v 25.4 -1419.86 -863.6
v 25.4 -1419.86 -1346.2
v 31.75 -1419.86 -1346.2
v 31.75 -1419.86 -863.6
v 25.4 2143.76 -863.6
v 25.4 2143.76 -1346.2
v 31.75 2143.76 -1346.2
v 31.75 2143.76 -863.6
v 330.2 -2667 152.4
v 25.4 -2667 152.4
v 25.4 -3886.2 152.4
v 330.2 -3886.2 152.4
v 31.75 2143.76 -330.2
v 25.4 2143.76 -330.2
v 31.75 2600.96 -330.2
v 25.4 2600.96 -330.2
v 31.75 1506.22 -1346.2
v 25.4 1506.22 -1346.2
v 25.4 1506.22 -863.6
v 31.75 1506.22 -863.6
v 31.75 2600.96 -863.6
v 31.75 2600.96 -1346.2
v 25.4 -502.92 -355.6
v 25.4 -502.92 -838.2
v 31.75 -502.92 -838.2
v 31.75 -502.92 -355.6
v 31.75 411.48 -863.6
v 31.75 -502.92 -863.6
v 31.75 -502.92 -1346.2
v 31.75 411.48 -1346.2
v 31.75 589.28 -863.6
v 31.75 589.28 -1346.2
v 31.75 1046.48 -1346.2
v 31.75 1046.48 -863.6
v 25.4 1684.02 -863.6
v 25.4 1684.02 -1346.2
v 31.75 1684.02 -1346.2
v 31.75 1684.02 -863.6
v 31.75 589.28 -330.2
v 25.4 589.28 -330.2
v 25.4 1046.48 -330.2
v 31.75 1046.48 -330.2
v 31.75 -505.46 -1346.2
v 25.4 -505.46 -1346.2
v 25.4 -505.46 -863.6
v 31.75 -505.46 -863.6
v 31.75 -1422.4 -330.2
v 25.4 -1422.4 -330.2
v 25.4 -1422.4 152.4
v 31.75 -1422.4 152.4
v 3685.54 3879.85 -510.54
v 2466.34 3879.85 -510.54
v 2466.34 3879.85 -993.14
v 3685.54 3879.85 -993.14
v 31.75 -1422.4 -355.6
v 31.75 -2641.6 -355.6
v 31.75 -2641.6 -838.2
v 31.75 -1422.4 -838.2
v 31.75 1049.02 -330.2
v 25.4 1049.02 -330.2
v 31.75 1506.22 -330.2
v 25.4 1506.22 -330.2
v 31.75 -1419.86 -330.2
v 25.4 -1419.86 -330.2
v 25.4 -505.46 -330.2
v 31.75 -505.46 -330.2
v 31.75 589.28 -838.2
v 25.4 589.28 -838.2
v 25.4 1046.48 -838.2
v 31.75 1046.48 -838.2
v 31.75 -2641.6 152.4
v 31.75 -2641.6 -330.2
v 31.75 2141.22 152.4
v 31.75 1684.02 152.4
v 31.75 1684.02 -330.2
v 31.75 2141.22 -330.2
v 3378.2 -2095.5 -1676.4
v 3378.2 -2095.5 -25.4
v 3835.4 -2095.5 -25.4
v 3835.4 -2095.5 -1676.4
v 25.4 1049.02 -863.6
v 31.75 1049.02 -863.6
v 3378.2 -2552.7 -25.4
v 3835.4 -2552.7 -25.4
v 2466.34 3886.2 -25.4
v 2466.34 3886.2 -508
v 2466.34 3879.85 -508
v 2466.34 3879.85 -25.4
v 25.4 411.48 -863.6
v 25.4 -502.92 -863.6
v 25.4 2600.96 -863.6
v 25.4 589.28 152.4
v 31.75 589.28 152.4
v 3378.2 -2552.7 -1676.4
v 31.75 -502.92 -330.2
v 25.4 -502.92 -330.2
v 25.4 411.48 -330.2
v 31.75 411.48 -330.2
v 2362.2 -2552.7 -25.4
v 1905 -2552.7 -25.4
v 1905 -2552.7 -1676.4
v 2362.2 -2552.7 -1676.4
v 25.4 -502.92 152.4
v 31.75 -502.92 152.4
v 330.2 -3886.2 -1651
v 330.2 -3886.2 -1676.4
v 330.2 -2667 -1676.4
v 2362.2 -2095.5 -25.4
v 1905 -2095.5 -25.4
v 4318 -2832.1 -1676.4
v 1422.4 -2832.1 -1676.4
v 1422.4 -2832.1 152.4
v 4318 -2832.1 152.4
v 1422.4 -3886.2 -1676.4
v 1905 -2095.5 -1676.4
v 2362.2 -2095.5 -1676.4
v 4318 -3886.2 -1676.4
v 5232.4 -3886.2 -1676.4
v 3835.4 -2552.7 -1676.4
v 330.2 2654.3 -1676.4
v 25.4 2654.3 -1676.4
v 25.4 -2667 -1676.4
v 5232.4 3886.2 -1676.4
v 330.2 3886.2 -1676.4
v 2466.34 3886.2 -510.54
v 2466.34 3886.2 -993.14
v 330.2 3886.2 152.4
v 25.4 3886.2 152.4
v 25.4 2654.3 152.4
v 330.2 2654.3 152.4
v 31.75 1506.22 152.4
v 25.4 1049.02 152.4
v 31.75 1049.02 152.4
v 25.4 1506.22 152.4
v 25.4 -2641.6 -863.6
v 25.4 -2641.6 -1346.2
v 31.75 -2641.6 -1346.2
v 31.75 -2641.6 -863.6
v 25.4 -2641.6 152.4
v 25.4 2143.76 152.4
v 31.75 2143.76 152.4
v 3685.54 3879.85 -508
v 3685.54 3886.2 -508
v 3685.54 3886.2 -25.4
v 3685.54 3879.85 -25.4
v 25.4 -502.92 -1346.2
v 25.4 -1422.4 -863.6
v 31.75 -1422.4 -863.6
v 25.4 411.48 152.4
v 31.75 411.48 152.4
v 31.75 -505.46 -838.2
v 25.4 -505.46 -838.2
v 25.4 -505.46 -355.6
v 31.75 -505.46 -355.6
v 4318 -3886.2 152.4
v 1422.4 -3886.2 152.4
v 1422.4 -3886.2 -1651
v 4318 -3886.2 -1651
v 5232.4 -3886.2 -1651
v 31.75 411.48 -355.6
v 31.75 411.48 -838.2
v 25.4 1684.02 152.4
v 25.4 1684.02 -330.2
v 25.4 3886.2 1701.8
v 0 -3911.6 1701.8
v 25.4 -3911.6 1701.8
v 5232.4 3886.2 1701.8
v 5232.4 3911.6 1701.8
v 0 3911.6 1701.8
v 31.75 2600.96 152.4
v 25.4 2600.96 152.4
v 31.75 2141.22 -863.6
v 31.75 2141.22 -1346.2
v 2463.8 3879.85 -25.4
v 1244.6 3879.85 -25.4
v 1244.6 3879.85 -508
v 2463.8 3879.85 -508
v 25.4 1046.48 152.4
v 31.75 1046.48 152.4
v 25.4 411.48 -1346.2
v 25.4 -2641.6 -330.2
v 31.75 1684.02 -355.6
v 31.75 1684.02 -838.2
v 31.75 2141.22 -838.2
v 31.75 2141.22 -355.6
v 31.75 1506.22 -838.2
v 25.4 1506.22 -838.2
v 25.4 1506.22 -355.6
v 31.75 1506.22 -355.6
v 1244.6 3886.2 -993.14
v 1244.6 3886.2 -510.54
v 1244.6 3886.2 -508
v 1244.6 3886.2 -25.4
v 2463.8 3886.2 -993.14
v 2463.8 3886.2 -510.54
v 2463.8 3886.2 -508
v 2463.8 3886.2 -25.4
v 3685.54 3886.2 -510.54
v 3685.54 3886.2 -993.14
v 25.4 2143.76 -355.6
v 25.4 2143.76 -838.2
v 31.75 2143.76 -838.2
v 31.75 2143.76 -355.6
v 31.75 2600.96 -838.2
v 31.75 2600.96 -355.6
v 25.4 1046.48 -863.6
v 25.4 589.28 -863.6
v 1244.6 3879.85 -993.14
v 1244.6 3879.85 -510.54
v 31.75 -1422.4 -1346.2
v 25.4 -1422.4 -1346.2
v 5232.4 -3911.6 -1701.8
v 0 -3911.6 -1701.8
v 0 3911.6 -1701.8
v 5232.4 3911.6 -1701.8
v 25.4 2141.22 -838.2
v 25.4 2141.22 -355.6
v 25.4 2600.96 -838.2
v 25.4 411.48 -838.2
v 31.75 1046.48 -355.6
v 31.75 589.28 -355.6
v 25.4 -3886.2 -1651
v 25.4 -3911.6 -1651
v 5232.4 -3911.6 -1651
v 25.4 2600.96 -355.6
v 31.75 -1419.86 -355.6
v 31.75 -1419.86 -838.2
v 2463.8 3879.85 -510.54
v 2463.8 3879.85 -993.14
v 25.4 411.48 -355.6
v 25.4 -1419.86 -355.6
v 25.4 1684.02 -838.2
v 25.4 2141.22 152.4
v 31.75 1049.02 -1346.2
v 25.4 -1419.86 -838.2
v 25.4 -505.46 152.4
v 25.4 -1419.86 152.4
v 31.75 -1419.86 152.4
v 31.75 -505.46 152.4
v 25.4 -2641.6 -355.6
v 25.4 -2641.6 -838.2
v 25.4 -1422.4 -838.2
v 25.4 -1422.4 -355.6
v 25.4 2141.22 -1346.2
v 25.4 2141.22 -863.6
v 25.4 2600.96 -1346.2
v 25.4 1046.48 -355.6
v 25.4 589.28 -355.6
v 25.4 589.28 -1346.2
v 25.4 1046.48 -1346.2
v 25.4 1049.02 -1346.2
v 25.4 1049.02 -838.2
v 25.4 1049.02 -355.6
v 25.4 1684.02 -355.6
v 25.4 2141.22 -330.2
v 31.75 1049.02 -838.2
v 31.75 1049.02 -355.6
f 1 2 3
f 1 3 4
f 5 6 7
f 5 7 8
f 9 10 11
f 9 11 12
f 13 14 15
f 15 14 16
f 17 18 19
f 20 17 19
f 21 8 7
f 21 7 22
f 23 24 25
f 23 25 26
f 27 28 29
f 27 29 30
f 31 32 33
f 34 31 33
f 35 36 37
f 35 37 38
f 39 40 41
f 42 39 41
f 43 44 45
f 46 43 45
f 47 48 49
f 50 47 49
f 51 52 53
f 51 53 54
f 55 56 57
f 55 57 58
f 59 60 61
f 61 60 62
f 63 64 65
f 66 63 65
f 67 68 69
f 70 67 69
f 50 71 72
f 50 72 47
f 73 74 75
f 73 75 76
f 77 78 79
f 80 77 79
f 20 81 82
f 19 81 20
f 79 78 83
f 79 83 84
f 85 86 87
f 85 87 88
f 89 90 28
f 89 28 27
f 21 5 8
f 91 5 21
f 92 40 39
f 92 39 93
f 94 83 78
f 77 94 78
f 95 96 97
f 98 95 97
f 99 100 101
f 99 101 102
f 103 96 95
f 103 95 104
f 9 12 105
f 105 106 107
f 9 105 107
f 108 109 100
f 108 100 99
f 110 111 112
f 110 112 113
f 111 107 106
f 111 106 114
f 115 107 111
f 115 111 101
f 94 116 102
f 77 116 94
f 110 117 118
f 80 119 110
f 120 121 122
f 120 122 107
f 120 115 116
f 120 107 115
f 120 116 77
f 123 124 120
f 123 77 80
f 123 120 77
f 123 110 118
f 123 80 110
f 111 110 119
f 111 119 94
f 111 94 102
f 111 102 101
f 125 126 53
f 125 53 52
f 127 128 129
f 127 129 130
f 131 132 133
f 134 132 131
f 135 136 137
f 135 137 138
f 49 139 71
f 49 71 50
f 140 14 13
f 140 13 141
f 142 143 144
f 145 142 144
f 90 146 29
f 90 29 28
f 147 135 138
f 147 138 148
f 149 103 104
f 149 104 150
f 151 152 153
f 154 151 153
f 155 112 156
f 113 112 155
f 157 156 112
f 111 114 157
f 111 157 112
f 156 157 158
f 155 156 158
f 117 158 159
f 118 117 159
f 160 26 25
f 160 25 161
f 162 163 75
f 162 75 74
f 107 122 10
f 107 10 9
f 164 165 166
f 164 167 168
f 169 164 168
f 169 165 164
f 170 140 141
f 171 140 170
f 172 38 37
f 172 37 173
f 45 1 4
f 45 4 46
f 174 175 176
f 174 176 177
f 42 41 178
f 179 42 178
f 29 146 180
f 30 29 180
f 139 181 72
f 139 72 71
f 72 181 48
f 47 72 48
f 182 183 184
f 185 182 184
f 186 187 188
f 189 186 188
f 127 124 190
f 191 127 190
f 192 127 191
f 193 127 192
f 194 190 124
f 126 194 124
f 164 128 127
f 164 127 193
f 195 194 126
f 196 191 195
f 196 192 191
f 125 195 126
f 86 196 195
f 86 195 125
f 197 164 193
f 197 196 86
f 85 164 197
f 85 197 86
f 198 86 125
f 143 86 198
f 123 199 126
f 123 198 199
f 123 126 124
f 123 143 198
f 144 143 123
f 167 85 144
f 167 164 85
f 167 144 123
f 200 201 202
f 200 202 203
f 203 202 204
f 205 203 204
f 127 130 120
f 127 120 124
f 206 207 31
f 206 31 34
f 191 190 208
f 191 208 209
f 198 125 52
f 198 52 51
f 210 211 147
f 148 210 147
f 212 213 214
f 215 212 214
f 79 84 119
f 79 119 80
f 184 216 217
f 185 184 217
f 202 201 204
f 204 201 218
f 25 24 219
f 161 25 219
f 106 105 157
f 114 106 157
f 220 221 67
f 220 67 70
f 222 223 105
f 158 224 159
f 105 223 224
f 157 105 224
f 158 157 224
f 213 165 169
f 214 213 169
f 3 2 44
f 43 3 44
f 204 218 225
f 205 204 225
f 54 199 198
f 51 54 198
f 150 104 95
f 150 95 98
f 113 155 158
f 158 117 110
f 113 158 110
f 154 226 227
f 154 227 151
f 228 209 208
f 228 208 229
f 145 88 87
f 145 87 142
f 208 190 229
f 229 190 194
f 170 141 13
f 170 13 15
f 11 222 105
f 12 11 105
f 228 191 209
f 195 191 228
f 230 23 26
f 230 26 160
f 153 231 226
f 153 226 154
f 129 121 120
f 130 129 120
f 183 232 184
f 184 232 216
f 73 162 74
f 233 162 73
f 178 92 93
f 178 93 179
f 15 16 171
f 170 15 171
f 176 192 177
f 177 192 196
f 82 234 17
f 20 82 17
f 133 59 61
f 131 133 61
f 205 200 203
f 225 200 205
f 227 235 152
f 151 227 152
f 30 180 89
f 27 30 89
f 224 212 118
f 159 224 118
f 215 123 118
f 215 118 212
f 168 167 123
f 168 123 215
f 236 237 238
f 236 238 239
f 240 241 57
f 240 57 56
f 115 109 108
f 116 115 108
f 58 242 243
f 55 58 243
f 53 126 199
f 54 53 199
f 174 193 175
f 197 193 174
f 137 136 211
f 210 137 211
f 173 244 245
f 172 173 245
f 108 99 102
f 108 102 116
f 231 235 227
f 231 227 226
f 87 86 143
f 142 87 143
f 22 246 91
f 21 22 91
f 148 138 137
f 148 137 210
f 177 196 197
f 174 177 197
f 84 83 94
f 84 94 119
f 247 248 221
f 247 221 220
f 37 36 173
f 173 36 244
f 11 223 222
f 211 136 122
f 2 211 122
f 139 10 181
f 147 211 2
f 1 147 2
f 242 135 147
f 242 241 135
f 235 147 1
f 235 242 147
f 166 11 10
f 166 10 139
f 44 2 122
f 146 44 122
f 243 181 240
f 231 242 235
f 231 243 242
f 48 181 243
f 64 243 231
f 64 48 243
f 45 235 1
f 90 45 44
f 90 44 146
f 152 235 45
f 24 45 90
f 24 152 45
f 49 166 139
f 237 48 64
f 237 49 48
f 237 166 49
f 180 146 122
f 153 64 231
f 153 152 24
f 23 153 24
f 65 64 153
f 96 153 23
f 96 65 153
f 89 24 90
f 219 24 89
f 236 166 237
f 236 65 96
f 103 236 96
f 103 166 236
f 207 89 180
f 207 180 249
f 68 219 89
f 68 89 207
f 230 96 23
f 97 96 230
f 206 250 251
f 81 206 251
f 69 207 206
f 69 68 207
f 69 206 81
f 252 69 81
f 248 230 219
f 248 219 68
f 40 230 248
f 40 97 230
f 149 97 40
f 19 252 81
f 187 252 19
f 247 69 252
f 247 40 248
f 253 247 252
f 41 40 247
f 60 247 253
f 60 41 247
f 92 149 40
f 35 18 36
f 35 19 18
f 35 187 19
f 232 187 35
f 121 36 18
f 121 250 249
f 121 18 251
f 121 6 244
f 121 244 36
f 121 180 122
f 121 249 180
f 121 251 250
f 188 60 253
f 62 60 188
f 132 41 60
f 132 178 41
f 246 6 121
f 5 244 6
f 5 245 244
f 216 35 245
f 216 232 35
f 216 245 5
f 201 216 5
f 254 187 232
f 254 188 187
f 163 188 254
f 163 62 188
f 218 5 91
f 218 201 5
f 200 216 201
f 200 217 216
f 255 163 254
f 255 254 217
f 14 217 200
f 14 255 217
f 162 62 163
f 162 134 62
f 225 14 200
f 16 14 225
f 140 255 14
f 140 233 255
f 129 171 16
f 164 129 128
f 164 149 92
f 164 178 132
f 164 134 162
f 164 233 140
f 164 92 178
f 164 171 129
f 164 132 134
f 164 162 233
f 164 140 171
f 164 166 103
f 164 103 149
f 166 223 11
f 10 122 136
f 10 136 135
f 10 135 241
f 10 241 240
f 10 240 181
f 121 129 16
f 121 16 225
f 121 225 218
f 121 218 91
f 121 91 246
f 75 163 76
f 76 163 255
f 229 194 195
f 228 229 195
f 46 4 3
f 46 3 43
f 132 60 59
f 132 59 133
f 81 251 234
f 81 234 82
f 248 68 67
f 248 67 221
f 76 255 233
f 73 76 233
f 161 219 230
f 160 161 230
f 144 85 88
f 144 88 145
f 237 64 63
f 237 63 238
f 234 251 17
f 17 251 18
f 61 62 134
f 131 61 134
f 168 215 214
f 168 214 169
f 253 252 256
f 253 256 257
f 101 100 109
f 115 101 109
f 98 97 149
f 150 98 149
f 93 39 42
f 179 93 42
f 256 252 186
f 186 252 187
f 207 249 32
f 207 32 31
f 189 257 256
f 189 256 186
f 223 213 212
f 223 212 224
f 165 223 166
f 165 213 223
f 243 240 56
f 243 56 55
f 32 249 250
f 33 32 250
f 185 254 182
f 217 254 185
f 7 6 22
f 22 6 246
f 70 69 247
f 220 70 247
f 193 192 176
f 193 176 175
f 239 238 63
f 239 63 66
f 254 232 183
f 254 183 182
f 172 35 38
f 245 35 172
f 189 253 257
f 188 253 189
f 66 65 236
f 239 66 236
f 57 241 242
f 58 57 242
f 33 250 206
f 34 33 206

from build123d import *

# Parameters (mm, degrees)
F0_W      = 7823.2
F0_H      = 3403.6
F1_DEPTH  = 5232.4
F3_DEPTH  = 5207
F4_W      = 5207
F4_H      = 7772.4
F5_DEPTH  = 25.4
F6_W      = 2895.6
F6_H      = 1054.1
F7_DEPTH  = 1828.8
F8_W      = 1219.2
F8_H      = 482.6
F8_W_2    = 914.4
F9_DEPTH  = 6.35
F10_W     = 457.2
F10_H     = 482.6
F11_DEPTH = 6.35
F12_W     = 1219.2
F12_H     = 482.6
F13_DEPTH = 6.35
F14_W     = 304.8
F14_H     = 1231.9
F15_DEPTH = 1828.8
F16_W     = 304.8
F16_H     = 1219.2
F17_DEPTH = 1828.8
F18_W     = 457.2
F18_H     = 457.2
F19_DEPTH = 1651


with BuildPart() as f1:
    # F0 (on Right) → F1 (new body)
    with BuildSketch(Plane.YZ):
        Rectangle(F0_W, F0_H)
    extrude(amount=F1_DEPTH)

    # F2 (on face) → F3 (cut)
    with BuildSketch(Plane.YZ.offset(5232.4)):
        Polygon((3886.2, 1701.8), (3911.6, 1701.8), (3976.405621, 2212.079525), (-4512.191772, 2212.079525), (-4512.191772, -1701.8), (-3911.6, -1701.8), (-3911.6, -1651), (3886.2, -1651), align=None)
    extrude(amount=-F3_DEPTH, mode=Mode.SUBTRACT)

    # F4 (on face) → F5 (cut)
    with BuildSketch(Plane.XY.offset(-1651)):
        with Locations((2628.9, 0)):
            Rectangle(F4_W, F4_H)
    extrude(amount=-F5_DEPTH, mode=Mode.SUBTRACT)

    # F6 (on face) → F7 (join)
    with BuildSketch(Plane.XY.offset(-1676.4)):
        with Locations((2870.2, -3359.15)):
            Rectangle(F6_W, F6_H)
    extrude(amount=F7_DEPTH)

    # F8 (on face) → F9 (join)
    with BuildSketch(Plane.YZ.offset(25.4)):
        with Locations((-2032, -88.9)):
            Rectangle(F8_W, F8_H)
        with Locations((-2032, -596.9)):
            Rectangle(F8_W, F8_H)
        with Locations((-2032, -1104.9)):
            Rectangle(F8_W, F8_H)
        with Locations((-962.66, -88.9)):
            Rectangle(F8_W_2, F8_H)
        with Locations((-962.66, -596.9)):
            Rectangle(F8_W_2, F8_H)
        with Locations((-962.66, -1104.9)):
            Rectangle(F8_W_2, F8_H)
        with Locations((-45.72, -88.9)):
            Rectangle(F8_W_2, F8_H)
        with Locations((-45.72, -596.9)):
            Rectangle(F8_W_2, F8_H)
        with Locations((-45.72, -1104.9)):
            Rectangle(F8_W_2, F8_H)
    extrude(amount=F9_DEPTH)

    # F10 (on face) → F11 (join)
    with BuildSketch(Plane.YZ.offset(25.4)):
        with Locations((817.88, -88.9)):
            Rectangle(F10_W, F10_H)
        with Locations((817.88, -596.9)):
            Rectangle(F10_W, F10_H)
        with Locations((817.88, -1104.9)):
            Rectangle(F10_W, F10_H)
        with Locations((1277.62, -88.9)):
            Rectangle(F10_W, F10_H)
        with Locations((1277.62, -596.9)):
            Rectangle(F10_W, F10_H)
        with Locations((1277.62, -1104.9)):
            Rectangle(F10_W, F10_H)
        with Locations((1912.62, -88.9)):
            Rectangle(F10_W, F10_H)
        with Locations((1912.62, -596.9)):
            Rectangle(F10_W, F10_H)
        with Locations((1912.62, -1104.9)):
            Rectangle(F10_W, F10_H)
        with Locations((2372.36, -88.9)):
            Rectangle(F10_W, F10_H)
        with Locations((2372.36, -596.9)):
            Rectangle(F10_W, F10_H)
        with Locations((2372.36, -1104.9)):
            Rectangle(F10_W, F10_H)
    extrude(amount=F11_DEPTH)

    # F12 (on face) → F13 (join)
    with BuildSketch(Plane.XZ.offset(-3886.2)):
        with Locations((1854.2, -266.7)):
            Rectangle(F12_W, F12_H)
        with Locations((3075.94, -266.7)):
            Rectangle(F12_W, F12_H)
        with Locations((1854.2, -751.84)):
            Rectangle(F12_W, F12_H)
        with Locations((3075.94, -751.84)):
            Rectangle(F12_W, F12_H)
    extrude(amount=F13_DEPTH)

    # F14 (on face) → F15 (join)
    with BuildSketch(Plane.XY.offset(-1676.4)):
        with Locations((177.8, 3270.25)):
            Rectangle(F14_W, F14_H)
    extrude(amount=F15_DEPTH)

    # F16 (on face) → F17 (join)
    with BuildSketch(Plane.XY.offset(-1676.4)):
        with Locations((177.8, -3276.6)):
            Rectangle(F16_W, F16_H)
    extrude(amount=F17_DEPTH)

    # F18 (on face) → F19 (join)
    with BuildSketch(Plane.XY.offset(-1676.4)):
        with Locations((2133.6, -2324.1)):
            Rectangle(F18_W, F18_H)
        with Locations((3606.8, -2324.1)):
            Rectangle(F18_W, F18_H)
    extrude(amount=F19_DEPTH)


solid = f1.part
